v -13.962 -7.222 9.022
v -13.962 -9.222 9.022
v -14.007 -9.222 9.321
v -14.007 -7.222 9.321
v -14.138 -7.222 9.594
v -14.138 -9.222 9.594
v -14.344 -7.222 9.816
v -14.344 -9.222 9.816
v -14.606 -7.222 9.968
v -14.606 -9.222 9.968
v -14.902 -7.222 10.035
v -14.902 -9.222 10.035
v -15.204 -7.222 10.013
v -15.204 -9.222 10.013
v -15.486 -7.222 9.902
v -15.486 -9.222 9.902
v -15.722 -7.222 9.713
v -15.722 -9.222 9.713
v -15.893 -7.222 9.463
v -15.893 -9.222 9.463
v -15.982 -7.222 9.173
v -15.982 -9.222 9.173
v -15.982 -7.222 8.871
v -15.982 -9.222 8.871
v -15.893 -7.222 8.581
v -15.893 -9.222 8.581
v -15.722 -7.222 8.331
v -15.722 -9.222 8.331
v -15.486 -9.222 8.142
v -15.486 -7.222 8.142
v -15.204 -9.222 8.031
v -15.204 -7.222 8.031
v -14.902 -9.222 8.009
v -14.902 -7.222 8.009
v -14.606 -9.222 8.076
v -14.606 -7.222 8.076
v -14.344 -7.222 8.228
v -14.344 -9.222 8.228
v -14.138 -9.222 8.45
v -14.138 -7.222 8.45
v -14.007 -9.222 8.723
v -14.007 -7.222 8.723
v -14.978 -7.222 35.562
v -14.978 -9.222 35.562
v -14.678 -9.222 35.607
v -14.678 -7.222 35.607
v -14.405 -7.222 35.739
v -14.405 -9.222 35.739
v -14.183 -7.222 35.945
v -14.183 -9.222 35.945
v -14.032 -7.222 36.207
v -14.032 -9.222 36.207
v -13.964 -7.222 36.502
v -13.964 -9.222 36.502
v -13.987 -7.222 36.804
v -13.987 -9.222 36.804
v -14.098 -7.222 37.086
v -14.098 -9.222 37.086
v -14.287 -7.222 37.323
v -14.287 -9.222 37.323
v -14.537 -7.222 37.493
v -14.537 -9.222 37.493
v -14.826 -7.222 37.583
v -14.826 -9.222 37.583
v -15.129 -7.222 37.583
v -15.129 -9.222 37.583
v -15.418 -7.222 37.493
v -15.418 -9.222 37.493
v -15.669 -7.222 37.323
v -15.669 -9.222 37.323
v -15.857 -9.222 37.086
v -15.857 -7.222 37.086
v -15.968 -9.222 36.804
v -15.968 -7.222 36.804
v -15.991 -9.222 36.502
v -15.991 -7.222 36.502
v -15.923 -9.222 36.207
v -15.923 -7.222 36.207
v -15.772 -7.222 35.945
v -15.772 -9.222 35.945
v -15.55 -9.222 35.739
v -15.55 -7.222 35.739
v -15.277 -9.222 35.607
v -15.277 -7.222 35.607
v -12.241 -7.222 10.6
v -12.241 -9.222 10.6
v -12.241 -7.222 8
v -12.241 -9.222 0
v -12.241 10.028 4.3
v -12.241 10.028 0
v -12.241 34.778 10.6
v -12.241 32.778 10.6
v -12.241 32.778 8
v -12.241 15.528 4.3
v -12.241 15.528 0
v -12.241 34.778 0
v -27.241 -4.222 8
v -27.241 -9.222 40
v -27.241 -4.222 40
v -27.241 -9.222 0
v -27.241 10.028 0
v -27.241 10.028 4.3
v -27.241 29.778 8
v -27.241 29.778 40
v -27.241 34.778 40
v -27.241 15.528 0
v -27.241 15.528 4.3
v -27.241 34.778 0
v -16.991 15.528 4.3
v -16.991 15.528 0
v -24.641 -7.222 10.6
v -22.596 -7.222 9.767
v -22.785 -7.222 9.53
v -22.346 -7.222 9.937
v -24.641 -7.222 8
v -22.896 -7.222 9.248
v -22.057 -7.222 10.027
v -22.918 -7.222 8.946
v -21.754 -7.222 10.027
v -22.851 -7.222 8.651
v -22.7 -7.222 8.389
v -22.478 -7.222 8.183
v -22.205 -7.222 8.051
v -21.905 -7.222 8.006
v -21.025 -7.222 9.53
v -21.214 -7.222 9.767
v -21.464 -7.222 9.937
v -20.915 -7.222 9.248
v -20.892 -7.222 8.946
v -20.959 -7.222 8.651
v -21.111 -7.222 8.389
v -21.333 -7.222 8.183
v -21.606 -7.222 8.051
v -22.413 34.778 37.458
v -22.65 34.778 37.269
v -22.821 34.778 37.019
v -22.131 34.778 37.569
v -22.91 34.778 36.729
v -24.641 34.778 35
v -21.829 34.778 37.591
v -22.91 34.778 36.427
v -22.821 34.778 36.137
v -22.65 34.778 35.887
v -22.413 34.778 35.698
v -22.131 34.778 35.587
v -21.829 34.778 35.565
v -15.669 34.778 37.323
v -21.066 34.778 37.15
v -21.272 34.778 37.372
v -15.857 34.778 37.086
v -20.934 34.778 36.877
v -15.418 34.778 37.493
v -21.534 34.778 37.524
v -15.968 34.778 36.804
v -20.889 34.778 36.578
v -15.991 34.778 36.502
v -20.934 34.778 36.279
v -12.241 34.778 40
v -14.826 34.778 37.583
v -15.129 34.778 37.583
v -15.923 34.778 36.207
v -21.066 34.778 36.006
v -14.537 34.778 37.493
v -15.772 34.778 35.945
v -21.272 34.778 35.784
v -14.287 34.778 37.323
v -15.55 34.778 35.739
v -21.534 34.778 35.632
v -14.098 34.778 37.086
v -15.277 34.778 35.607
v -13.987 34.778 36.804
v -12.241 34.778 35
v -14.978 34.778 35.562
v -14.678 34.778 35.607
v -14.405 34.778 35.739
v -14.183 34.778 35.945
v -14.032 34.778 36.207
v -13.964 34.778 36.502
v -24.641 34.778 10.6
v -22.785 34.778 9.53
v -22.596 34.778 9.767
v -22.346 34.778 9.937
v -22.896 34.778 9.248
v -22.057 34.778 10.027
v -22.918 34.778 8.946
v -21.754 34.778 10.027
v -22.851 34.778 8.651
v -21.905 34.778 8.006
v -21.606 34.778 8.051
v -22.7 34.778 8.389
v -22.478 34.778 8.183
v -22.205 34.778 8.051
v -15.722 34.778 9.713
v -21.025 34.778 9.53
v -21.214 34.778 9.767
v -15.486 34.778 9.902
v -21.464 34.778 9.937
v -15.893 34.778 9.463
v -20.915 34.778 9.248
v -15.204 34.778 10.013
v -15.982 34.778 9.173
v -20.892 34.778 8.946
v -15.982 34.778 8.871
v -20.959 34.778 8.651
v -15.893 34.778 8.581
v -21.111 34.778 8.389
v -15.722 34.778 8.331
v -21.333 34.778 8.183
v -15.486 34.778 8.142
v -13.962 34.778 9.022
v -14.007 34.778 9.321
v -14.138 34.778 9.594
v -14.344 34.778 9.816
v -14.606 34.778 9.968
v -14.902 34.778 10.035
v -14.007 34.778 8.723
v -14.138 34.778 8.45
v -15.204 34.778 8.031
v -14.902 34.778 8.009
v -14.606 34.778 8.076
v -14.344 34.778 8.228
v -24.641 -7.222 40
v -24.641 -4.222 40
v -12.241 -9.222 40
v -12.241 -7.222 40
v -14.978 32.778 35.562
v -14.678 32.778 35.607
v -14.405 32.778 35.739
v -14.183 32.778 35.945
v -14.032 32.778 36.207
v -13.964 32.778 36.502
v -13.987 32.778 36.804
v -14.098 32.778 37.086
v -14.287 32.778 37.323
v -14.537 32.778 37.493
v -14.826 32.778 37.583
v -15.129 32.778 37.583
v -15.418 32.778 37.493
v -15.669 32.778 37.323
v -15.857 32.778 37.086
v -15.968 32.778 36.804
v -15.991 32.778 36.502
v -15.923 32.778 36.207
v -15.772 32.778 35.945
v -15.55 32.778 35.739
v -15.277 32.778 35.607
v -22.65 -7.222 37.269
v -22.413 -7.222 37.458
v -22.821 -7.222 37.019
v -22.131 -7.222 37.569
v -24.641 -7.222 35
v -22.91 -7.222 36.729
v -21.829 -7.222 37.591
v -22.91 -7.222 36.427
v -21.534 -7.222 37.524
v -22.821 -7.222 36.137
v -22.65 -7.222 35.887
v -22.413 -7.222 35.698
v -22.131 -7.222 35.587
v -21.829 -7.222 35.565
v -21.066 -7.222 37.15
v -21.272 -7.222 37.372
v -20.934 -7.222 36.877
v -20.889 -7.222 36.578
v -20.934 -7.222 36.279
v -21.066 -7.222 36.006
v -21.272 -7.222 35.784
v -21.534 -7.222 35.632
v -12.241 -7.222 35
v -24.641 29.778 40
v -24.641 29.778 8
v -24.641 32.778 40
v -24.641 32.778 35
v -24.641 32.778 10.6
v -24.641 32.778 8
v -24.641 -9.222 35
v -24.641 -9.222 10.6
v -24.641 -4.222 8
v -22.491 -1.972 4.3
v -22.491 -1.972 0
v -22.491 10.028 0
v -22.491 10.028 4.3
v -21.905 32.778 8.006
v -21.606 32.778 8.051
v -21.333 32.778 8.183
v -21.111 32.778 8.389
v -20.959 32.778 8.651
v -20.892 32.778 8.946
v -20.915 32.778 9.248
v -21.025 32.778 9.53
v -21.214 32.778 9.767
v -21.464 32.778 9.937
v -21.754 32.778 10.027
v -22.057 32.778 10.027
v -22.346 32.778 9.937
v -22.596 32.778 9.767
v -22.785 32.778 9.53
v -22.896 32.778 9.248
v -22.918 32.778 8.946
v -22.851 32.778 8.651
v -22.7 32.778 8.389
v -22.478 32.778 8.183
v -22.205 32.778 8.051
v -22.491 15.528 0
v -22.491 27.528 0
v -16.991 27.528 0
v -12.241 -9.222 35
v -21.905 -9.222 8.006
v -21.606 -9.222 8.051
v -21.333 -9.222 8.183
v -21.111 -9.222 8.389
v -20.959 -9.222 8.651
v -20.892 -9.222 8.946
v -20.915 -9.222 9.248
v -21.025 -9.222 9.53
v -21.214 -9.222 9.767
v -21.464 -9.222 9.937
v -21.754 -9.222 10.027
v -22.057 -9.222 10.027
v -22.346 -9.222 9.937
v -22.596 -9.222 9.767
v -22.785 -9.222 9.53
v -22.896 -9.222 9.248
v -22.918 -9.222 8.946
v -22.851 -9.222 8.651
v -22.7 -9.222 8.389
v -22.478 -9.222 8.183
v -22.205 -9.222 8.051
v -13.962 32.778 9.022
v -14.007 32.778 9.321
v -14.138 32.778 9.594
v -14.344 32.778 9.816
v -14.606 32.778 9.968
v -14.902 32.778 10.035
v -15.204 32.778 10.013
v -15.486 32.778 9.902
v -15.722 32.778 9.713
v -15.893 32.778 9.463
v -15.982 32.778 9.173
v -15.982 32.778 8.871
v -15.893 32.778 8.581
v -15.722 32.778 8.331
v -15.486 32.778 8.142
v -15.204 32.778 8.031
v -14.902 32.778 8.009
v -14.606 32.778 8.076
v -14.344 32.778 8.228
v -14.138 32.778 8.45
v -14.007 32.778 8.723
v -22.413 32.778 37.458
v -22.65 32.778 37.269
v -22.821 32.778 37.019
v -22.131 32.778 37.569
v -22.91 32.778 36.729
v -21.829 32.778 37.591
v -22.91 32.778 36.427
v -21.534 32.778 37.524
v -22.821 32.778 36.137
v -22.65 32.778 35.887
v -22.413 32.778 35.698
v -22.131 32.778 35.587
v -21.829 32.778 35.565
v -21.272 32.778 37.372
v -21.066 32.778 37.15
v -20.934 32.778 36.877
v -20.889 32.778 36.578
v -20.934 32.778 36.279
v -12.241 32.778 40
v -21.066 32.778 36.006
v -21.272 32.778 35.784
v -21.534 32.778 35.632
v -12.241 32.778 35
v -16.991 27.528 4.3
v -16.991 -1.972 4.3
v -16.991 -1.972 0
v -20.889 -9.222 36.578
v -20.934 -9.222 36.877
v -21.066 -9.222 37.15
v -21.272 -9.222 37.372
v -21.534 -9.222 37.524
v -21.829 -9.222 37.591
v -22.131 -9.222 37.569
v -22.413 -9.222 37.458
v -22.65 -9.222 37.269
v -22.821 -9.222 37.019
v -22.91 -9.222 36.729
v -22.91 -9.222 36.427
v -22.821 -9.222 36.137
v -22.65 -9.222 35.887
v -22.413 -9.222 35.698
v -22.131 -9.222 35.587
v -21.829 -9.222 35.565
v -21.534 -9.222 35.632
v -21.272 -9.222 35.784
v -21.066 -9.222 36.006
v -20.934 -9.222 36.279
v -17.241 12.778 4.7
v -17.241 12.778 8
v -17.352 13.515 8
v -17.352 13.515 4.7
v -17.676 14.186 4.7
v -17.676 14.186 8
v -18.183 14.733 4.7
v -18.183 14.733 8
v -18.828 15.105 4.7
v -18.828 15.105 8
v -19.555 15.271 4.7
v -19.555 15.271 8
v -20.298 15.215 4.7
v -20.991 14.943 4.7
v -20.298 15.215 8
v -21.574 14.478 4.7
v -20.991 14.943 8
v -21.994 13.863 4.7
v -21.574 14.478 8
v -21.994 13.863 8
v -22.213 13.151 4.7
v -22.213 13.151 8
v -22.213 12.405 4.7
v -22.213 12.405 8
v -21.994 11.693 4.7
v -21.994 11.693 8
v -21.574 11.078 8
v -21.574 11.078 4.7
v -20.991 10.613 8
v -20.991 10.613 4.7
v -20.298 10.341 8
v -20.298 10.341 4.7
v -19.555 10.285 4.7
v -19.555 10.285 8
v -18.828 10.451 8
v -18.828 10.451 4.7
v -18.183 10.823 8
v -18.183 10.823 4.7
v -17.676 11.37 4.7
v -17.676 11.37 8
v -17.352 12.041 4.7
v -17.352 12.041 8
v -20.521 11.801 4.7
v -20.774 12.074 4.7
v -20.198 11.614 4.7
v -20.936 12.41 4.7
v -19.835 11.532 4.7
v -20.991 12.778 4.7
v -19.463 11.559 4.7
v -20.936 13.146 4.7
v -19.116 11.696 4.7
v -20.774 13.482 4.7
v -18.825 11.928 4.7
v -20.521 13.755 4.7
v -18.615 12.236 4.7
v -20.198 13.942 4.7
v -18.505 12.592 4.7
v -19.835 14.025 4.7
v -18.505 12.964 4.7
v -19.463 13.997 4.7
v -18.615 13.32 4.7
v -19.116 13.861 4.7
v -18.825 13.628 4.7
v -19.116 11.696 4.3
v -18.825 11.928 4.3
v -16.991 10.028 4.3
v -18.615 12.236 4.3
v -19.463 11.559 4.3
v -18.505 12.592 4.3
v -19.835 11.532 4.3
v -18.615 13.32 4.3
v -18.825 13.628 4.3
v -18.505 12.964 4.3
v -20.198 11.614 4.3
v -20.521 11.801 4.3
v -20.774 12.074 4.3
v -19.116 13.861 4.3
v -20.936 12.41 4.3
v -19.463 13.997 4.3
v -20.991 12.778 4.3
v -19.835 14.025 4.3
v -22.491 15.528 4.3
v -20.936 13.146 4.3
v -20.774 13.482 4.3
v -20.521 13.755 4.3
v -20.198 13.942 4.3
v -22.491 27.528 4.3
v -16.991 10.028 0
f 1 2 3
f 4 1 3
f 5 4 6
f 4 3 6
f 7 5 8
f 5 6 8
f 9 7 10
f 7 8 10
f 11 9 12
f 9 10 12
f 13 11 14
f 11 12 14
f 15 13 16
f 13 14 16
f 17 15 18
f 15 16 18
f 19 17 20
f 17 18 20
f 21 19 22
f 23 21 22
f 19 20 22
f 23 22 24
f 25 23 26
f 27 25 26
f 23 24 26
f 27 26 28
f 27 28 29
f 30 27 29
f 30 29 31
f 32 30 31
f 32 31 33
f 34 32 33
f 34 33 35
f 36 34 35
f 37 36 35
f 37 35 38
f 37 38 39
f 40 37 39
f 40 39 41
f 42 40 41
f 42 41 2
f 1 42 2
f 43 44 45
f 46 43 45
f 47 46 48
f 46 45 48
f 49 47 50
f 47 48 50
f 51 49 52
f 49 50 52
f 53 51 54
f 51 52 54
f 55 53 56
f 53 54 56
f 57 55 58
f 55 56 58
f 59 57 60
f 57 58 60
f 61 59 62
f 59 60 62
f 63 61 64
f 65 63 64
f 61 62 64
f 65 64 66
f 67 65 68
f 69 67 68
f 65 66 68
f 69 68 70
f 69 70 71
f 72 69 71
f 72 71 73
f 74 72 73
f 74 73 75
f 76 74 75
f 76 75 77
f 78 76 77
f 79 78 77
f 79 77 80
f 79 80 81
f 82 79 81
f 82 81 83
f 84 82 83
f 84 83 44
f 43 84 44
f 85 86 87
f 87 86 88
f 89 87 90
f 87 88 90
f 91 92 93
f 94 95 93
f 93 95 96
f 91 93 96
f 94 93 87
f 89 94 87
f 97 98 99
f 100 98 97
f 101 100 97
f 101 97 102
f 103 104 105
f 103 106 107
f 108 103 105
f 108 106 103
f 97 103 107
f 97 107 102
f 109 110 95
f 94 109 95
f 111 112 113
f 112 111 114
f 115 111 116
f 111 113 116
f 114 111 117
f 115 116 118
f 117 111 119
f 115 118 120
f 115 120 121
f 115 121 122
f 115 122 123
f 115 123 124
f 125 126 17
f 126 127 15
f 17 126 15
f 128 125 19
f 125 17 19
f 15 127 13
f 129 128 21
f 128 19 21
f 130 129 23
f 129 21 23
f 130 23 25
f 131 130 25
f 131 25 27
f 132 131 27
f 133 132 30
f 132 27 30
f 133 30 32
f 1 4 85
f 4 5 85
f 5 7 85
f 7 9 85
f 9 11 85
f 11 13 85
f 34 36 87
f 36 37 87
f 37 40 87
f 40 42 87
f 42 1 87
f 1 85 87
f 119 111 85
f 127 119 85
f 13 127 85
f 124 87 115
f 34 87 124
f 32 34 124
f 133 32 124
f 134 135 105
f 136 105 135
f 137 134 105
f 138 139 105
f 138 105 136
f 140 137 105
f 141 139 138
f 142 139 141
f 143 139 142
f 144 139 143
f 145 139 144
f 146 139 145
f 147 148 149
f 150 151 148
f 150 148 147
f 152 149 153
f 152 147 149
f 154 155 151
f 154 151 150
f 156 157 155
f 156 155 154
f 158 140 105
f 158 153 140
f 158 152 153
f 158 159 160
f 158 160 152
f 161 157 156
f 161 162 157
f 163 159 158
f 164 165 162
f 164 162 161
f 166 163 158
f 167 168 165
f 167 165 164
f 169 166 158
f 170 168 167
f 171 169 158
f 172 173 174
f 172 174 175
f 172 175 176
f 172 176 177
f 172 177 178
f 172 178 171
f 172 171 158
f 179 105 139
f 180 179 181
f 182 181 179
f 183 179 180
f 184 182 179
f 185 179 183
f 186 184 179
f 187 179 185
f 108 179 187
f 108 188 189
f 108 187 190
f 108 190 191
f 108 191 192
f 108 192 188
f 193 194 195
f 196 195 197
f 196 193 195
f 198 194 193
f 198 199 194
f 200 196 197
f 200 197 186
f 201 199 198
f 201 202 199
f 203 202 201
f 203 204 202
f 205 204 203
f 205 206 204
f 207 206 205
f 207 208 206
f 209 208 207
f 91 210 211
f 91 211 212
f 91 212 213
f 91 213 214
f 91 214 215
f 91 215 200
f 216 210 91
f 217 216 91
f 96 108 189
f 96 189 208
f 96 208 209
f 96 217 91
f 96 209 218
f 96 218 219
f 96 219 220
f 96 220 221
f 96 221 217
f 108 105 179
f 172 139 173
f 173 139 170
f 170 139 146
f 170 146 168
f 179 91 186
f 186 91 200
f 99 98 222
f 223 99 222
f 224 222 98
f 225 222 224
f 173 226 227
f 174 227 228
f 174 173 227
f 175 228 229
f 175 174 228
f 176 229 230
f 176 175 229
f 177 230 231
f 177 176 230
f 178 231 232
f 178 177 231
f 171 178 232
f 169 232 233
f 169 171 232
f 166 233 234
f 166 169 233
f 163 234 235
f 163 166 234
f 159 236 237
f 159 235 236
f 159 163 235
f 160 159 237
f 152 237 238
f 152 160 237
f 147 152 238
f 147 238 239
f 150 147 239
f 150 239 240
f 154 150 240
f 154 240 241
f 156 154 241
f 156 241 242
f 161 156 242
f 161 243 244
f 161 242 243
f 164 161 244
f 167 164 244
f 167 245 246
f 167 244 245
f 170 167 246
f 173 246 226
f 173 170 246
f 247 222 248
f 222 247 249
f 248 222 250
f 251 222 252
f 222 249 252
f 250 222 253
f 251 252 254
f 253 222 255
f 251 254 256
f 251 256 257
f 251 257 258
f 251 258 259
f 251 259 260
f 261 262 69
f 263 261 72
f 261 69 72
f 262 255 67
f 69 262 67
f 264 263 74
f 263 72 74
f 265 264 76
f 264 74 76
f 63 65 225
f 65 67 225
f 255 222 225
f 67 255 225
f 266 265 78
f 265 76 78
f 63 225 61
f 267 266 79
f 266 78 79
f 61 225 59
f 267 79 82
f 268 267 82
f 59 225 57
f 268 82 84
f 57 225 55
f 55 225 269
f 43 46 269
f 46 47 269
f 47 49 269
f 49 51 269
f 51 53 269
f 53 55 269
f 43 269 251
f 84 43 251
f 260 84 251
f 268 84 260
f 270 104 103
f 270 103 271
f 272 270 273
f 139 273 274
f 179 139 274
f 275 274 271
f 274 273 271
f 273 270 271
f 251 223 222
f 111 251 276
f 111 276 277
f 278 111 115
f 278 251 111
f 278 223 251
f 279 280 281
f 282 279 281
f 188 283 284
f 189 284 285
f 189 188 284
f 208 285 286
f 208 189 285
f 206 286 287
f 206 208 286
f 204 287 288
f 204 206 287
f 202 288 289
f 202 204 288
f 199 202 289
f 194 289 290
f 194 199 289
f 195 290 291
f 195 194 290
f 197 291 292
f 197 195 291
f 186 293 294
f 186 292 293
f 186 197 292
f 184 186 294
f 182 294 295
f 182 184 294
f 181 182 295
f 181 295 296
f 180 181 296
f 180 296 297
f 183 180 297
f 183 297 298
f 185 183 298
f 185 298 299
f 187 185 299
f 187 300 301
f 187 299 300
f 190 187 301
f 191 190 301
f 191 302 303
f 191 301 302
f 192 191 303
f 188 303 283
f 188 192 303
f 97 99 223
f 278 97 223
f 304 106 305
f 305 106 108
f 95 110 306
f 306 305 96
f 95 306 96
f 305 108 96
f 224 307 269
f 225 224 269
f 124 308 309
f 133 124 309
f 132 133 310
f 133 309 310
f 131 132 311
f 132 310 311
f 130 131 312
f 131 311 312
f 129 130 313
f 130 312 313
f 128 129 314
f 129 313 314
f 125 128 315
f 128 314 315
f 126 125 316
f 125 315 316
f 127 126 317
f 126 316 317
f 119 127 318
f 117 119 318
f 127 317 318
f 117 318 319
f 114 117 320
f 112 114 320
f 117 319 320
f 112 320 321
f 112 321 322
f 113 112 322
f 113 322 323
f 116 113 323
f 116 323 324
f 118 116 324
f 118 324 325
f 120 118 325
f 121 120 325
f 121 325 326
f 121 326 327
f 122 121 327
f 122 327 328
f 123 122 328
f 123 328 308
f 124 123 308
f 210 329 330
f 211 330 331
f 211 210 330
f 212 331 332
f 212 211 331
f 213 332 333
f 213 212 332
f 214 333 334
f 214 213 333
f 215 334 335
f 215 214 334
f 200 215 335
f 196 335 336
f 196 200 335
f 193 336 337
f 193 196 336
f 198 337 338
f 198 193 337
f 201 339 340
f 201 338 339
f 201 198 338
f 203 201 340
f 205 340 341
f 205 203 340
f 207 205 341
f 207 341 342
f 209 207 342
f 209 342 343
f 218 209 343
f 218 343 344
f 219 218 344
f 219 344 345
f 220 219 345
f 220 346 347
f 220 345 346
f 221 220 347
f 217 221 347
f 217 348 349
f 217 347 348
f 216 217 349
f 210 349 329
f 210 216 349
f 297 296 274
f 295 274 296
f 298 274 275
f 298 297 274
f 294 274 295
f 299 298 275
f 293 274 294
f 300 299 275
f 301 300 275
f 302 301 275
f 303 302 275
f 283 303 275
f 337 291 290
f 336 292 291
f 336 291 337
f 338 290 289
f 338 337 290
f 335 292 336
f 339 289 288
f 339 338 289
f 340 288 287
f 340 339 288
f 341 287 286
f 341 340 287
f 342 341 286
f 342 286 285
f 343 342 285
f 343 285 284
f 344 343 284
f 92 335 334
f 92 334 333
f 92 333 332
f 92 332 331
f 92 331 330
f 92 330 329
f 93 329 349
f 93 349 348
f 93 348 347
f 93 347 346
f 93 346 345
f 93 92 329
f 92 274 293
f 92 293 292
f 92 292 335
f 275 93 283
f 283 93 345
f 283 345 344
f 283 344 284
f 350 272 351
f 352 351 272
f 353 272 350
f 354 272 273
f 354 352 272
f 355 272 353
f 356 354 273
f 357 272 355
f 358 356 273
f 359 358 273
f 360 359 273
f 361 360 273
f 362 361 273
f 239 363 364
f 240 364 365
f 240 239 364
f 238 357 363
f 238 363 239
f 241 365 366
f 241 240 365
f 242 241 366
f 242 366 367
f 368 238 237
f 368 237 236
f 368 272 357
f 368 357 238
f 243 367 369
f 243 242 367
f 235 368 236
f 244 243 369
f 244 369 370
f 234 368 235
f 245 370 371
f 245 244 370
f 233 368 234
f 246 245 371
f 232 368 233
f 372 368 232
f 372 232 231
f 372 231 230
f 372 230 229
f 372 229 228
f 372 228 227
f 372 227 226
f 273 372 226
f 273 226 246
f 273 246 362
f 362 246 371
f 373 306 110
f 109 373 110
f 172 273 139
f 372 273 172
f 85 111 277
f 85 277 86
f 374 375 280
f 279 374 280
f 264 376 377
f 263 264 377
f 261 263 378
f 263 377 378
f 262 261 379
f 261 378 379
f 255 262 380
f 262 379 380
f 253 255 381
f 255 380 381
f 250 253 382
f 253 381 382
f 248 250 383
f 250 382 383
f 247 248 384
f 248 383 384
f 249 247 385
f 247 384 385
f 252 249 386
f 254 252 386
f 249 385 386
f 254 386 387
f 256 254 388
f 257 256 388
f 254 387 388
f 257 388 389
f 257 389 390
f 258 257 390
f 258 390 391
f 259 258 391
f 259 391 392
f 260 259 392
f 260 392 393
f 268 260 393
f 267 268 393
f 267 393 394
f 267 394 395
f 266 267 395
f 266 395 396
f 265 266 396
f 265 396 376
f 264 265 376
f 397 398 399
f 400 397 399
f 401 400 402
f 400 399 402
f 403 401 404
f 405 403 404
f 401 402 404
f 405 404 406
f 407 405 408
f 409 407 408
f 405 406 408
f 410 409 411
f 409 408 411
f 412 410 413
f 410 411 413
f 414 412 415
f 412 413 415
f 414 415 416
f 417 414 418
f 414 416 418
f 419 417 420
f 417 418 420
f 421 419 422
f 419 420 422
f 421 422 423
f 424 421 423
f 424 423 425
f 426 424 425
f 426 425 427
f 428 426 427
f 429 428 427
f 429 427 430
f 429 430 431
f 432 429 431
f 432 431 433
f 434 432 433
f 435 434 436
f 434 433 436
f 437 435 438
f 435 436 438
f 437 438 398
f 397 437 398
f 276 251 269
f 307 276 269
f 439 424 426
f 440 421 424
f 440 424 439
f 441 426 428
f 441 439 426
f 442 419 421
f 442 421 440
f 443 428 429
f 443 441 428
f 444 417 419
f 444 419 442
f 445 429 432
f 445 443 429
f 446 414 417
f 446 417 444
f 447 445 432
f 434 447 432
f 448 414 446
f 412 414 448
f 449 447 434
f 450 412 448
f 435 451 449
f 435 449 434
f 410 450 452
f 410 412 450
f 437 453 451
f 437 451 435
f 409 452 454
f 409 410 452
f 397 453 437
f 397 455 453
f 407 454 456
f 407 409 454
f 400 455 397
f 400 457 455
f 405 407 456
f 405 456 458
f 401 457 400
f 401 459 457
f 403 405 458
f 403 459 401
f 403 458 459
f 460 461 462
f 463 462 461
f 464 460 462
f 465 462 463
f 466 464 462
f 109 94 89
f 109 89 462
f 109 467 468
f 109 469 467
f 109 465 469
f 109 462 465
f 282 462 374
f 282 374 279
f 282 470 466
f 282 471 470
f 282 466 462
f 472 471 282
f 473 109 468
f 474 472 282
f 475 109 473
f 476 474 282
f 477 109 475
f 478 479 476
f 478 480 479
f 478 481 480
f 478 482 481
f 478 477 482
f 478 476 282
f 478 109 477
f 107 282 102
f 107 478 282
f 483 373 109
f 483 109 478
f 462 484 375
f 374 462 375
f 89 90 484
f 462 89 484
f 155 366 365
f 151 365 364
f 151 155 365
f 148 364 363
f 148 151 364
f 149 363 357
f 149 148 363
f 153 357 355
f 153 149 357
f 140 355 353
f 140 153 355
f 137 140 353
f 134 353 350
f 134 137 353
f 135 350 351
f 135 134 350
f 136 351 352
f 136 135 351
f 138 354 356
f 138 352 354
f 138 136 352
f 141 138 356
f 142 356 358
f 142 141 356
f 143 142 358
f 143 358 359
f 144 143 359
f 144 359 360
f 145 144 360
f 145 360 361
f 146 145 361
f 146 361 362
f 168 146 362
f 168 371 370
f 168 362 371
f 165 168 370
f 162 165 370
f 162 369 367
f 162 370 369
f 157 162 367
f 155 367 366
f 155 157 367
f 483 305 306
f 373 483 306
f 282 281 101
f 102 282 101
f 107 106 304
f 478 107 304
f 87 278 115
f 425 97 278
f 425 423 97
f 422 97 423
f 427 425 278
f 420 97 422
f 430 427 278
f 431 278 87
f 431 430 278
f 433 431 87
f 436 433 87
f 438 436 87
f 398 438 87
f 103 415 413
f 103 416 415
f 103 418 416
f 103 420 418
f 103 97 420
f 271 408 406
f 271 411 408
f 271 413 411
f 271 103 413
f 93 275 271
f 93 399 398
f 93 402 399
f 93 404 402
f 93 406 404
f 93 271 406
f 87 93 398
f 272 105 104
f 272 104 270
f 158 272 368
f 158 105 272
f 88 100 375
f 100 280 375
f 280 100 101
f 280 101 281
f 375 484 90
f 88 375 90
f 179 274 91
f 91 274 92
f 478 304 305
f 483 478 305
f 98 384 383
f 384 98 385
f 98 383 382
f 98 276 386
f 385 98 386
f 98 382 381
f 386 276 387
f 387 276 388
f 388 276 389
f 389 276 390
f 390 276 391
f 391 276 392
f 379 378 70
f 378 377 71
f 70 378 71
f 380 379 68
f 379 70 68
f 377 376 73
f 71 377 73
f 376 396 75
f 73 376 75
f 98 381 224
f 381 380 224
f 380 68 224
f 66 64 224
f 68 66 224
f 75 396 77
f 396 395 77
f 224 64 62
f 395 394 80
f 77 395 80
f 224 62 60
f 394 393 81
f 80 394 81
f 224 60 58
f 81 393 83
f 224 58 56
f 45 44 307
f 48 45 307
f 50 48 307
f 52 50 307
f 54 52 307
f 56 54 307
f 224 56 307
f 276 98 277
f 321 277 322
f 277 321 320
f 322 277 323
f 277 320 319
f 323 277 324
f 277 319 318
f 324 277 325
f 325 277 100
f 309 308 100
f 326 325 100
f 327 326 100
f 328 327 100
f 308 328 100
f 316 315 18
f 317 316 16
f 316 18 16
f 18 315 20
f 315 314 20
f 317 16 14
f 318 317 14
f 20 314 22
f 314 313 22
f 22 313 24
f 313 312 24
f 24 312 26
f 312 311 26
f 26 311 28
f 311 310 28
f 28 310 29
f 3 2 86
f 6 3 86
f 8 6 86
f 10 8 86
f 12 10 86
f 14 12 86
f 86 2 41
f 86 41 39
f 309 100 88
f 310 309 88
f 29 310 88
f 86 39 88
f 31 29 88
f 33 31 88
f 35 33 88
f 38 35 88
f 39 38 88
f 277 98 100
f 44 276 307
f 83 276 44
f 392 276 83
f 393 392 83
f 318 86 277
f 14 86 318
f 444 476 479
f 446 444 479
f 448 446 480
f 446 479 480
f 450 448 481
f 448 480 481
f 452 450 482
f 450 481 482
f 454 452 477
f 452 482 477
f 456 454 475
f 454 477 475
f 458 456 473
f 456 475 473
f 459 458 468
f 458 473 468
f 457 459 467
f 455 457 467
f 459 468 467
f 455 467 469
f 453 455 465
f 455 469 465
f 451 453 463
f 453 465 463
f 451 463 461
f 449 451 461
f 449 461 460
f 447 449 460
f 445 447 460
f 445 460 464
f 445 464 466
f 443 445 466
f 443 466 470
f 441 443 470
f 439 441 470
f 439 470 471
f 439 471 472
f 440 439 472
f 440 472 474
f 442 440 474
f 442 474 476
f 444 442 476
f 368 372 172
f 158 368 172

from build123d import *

# Parameters (mm, degrees)
SKETCH1_W          = 15
SKETCH1_H          = 44
EXTRUDE1_DEPTH     = 40
SKETCH2_W          = 15
SKETCH2_H          = 34
CUT_EXTRUDE1_DEPTH = 32
CUT_EXTRUDE2_DEPTH = 4.3
SKETCH4_R          = 1.25
CUT_EXTRUDE3_DEPTH = 4.3
SKETCH5_R          = 2.5
CUT_EXTRUDE4_DEPTH = 3.3
SKETCH6_W          = 12.4
SKETCH6_H          = 24.4
CUT_EXTRUDE5_DEPTH = 10
SKETCH7_W          = 5
SKETCH7_H          = 3
SKETCH7_W_2        = 2.6
CUT_EXTRUDE6_DEPTH = 12.4
SKETCH8_R          = 1.016
CUT_EXTRUDE7_DEPTH = 20


with BuildPart() as part:
    # Sketch1 → Extrude1 (new body)
    with BuildSketch(Plane.XY):
        with Locations((-19.74138299, 12.778040673)):
            Rectangle(SKETCH1_W, SKETCH1_H)
    extrude(amount=EXTRUDE1_DEPTH)

    # Sketch2 → Cut-Extrude1 (cut)
    with BuildSketch(Plane.XY.offset(40)):
        with Locations((-19.74138299, 12.778040673)):
            Rectangle(SKETCH2_W, SKETCH2_H)
    extrude(amount=-CUT_EXTRUDE1_DEPTH, mode=Mode.SUBTRACT)

    # Sketch3 → Cut-Extrude2 (cut)
    with BuildSketch(Plane(origin=(0, 0, 0), x_dir=(-1, 0, 0), z_dir=(0, 0, -1))):
        Polygon((22.49138299, 10.028040673), (27.24138299, 10.028040673), (27.24138299, 15.528040673), (22.49138299, 15.528040673), (22.49138299, 27.528040673), (16.99138299, 27.528040673), (16.99138299, 15.528040673), (12.24138299, 15.528040673), (12.24138299, 10.028040673), (16.99138299, 10.028040673), (16.99138299, -1.971959327), (22.49138299, -1.971959327), align=None)
    extrude(amount=-CUT_EXTRUDE2_DEPTH, mode=Mode.SUBTRACT)

    # Sketch4 → Cut-Extrude3 (cut)
    with BuildSketch(Plane(origin=(0, 0, 4.3), x_dir=(-1, 0, 0), z_dir=(0, 0, -1))):
        with Locations((19.74138299, 12.778040673)):
            Circle(SKETCH4_R)
    extrude(amount=-CUT_EXTRUDE3_DEPTH, mode=Mode.SUBTRACT)

    # Sketch5 → Cut-Extrude4 (cut)
    with BuildSketch(Plane.XY.offset(8)):
        with Locations((-19.74138299, 12.778040673)):
            Circle(SKETCH5_R)
    extrude(amount=-CUT_EXTRUDE4_DEPTH, mode=Mode.SUBTRACT)

    # Sketch6 → Cut-Extrude5 (cut)
    with BuildSketch(Plane(origin=(0, -4.221959327, 0), x_dir=(1, 0, 0), z_dir=(0, 1, 0))):
        with Locations((-18.44138299, -22.8)):
            Rectangle(SKETCH6_W, SKETCH6_H)
    cut_extrude5 = extrude(amount=-CUT_EXTRUDE5_DEPTH, mode=Mode.SUBTRACT)

    # Sketch7 → Cut-Extrude6 (cut)
    with BuildSketch(Plane(origin=(-12.24138299, 0, 0), x_dir=(0, 0, -1), z_dir=(1, 0, 0))):
        with Locations((-37.5, -5.721959327)):
            Rectangle(SKETCH7_W, SKETCH7_H)
        with Locations((-9.3, -5.721959327)):
            Rectangle(SKETCH7_W_2, SKETCH7_H)
    cut_extrude6 = extrude(amount=-CUT_EXTRUDE6_DEPTH, mode=Mode.SUBTRACT)

    # Sketch8 → Cut-Extrude7 (cut)
    with BuildSketch(Plane.XZ.offset(9.221959327)):
        with Locations((-21.90518052, 36.578)):
            Circle(SKETCH8_R)
        with Locations(Location((-14.977585459, 36.578, 0), (0, 0, 270))):
            Circle(SKETCH8_R)
        with Locations((-14.977585459, 9.022)):
            Circle(SKETCH8_R)
        with Locations(Location((-21.90518052, 9.022, 0), (0, 0, 270))):
            Circle(SKETCH8_R)
    cut_extrude7 = extrude(amount=-CUT_EXTRUDE7_DEPTH, mode=Mode.SUBTRACT)

    # Mirror1: Cut-Extrude5, Cut-Extrude6, Cut-Extrude7 across plane
    add(cut_extrude5.mirror(Plane(origin=(0, 12.778040673, 0), x_dir=(0, 0, 1), z_dir=(0, -1, 0))), mode=Mode.SUBTRACT)
    add(cut_extrude6.mirror(Plane(origin=(0, 12.778040673, 0), x_dir=(0, 0, 1), z_dir=(0, -1, 0))), mode=Mode.SUBTRACT)
    add(cut_extrude7.mirror(Plane(origin=(0, 12.778040673, 0), x_dir=(0, 0, 1), z_dir=(0, -1, 0))), mode=Mode.SUBTRACT)


solid = part.part
